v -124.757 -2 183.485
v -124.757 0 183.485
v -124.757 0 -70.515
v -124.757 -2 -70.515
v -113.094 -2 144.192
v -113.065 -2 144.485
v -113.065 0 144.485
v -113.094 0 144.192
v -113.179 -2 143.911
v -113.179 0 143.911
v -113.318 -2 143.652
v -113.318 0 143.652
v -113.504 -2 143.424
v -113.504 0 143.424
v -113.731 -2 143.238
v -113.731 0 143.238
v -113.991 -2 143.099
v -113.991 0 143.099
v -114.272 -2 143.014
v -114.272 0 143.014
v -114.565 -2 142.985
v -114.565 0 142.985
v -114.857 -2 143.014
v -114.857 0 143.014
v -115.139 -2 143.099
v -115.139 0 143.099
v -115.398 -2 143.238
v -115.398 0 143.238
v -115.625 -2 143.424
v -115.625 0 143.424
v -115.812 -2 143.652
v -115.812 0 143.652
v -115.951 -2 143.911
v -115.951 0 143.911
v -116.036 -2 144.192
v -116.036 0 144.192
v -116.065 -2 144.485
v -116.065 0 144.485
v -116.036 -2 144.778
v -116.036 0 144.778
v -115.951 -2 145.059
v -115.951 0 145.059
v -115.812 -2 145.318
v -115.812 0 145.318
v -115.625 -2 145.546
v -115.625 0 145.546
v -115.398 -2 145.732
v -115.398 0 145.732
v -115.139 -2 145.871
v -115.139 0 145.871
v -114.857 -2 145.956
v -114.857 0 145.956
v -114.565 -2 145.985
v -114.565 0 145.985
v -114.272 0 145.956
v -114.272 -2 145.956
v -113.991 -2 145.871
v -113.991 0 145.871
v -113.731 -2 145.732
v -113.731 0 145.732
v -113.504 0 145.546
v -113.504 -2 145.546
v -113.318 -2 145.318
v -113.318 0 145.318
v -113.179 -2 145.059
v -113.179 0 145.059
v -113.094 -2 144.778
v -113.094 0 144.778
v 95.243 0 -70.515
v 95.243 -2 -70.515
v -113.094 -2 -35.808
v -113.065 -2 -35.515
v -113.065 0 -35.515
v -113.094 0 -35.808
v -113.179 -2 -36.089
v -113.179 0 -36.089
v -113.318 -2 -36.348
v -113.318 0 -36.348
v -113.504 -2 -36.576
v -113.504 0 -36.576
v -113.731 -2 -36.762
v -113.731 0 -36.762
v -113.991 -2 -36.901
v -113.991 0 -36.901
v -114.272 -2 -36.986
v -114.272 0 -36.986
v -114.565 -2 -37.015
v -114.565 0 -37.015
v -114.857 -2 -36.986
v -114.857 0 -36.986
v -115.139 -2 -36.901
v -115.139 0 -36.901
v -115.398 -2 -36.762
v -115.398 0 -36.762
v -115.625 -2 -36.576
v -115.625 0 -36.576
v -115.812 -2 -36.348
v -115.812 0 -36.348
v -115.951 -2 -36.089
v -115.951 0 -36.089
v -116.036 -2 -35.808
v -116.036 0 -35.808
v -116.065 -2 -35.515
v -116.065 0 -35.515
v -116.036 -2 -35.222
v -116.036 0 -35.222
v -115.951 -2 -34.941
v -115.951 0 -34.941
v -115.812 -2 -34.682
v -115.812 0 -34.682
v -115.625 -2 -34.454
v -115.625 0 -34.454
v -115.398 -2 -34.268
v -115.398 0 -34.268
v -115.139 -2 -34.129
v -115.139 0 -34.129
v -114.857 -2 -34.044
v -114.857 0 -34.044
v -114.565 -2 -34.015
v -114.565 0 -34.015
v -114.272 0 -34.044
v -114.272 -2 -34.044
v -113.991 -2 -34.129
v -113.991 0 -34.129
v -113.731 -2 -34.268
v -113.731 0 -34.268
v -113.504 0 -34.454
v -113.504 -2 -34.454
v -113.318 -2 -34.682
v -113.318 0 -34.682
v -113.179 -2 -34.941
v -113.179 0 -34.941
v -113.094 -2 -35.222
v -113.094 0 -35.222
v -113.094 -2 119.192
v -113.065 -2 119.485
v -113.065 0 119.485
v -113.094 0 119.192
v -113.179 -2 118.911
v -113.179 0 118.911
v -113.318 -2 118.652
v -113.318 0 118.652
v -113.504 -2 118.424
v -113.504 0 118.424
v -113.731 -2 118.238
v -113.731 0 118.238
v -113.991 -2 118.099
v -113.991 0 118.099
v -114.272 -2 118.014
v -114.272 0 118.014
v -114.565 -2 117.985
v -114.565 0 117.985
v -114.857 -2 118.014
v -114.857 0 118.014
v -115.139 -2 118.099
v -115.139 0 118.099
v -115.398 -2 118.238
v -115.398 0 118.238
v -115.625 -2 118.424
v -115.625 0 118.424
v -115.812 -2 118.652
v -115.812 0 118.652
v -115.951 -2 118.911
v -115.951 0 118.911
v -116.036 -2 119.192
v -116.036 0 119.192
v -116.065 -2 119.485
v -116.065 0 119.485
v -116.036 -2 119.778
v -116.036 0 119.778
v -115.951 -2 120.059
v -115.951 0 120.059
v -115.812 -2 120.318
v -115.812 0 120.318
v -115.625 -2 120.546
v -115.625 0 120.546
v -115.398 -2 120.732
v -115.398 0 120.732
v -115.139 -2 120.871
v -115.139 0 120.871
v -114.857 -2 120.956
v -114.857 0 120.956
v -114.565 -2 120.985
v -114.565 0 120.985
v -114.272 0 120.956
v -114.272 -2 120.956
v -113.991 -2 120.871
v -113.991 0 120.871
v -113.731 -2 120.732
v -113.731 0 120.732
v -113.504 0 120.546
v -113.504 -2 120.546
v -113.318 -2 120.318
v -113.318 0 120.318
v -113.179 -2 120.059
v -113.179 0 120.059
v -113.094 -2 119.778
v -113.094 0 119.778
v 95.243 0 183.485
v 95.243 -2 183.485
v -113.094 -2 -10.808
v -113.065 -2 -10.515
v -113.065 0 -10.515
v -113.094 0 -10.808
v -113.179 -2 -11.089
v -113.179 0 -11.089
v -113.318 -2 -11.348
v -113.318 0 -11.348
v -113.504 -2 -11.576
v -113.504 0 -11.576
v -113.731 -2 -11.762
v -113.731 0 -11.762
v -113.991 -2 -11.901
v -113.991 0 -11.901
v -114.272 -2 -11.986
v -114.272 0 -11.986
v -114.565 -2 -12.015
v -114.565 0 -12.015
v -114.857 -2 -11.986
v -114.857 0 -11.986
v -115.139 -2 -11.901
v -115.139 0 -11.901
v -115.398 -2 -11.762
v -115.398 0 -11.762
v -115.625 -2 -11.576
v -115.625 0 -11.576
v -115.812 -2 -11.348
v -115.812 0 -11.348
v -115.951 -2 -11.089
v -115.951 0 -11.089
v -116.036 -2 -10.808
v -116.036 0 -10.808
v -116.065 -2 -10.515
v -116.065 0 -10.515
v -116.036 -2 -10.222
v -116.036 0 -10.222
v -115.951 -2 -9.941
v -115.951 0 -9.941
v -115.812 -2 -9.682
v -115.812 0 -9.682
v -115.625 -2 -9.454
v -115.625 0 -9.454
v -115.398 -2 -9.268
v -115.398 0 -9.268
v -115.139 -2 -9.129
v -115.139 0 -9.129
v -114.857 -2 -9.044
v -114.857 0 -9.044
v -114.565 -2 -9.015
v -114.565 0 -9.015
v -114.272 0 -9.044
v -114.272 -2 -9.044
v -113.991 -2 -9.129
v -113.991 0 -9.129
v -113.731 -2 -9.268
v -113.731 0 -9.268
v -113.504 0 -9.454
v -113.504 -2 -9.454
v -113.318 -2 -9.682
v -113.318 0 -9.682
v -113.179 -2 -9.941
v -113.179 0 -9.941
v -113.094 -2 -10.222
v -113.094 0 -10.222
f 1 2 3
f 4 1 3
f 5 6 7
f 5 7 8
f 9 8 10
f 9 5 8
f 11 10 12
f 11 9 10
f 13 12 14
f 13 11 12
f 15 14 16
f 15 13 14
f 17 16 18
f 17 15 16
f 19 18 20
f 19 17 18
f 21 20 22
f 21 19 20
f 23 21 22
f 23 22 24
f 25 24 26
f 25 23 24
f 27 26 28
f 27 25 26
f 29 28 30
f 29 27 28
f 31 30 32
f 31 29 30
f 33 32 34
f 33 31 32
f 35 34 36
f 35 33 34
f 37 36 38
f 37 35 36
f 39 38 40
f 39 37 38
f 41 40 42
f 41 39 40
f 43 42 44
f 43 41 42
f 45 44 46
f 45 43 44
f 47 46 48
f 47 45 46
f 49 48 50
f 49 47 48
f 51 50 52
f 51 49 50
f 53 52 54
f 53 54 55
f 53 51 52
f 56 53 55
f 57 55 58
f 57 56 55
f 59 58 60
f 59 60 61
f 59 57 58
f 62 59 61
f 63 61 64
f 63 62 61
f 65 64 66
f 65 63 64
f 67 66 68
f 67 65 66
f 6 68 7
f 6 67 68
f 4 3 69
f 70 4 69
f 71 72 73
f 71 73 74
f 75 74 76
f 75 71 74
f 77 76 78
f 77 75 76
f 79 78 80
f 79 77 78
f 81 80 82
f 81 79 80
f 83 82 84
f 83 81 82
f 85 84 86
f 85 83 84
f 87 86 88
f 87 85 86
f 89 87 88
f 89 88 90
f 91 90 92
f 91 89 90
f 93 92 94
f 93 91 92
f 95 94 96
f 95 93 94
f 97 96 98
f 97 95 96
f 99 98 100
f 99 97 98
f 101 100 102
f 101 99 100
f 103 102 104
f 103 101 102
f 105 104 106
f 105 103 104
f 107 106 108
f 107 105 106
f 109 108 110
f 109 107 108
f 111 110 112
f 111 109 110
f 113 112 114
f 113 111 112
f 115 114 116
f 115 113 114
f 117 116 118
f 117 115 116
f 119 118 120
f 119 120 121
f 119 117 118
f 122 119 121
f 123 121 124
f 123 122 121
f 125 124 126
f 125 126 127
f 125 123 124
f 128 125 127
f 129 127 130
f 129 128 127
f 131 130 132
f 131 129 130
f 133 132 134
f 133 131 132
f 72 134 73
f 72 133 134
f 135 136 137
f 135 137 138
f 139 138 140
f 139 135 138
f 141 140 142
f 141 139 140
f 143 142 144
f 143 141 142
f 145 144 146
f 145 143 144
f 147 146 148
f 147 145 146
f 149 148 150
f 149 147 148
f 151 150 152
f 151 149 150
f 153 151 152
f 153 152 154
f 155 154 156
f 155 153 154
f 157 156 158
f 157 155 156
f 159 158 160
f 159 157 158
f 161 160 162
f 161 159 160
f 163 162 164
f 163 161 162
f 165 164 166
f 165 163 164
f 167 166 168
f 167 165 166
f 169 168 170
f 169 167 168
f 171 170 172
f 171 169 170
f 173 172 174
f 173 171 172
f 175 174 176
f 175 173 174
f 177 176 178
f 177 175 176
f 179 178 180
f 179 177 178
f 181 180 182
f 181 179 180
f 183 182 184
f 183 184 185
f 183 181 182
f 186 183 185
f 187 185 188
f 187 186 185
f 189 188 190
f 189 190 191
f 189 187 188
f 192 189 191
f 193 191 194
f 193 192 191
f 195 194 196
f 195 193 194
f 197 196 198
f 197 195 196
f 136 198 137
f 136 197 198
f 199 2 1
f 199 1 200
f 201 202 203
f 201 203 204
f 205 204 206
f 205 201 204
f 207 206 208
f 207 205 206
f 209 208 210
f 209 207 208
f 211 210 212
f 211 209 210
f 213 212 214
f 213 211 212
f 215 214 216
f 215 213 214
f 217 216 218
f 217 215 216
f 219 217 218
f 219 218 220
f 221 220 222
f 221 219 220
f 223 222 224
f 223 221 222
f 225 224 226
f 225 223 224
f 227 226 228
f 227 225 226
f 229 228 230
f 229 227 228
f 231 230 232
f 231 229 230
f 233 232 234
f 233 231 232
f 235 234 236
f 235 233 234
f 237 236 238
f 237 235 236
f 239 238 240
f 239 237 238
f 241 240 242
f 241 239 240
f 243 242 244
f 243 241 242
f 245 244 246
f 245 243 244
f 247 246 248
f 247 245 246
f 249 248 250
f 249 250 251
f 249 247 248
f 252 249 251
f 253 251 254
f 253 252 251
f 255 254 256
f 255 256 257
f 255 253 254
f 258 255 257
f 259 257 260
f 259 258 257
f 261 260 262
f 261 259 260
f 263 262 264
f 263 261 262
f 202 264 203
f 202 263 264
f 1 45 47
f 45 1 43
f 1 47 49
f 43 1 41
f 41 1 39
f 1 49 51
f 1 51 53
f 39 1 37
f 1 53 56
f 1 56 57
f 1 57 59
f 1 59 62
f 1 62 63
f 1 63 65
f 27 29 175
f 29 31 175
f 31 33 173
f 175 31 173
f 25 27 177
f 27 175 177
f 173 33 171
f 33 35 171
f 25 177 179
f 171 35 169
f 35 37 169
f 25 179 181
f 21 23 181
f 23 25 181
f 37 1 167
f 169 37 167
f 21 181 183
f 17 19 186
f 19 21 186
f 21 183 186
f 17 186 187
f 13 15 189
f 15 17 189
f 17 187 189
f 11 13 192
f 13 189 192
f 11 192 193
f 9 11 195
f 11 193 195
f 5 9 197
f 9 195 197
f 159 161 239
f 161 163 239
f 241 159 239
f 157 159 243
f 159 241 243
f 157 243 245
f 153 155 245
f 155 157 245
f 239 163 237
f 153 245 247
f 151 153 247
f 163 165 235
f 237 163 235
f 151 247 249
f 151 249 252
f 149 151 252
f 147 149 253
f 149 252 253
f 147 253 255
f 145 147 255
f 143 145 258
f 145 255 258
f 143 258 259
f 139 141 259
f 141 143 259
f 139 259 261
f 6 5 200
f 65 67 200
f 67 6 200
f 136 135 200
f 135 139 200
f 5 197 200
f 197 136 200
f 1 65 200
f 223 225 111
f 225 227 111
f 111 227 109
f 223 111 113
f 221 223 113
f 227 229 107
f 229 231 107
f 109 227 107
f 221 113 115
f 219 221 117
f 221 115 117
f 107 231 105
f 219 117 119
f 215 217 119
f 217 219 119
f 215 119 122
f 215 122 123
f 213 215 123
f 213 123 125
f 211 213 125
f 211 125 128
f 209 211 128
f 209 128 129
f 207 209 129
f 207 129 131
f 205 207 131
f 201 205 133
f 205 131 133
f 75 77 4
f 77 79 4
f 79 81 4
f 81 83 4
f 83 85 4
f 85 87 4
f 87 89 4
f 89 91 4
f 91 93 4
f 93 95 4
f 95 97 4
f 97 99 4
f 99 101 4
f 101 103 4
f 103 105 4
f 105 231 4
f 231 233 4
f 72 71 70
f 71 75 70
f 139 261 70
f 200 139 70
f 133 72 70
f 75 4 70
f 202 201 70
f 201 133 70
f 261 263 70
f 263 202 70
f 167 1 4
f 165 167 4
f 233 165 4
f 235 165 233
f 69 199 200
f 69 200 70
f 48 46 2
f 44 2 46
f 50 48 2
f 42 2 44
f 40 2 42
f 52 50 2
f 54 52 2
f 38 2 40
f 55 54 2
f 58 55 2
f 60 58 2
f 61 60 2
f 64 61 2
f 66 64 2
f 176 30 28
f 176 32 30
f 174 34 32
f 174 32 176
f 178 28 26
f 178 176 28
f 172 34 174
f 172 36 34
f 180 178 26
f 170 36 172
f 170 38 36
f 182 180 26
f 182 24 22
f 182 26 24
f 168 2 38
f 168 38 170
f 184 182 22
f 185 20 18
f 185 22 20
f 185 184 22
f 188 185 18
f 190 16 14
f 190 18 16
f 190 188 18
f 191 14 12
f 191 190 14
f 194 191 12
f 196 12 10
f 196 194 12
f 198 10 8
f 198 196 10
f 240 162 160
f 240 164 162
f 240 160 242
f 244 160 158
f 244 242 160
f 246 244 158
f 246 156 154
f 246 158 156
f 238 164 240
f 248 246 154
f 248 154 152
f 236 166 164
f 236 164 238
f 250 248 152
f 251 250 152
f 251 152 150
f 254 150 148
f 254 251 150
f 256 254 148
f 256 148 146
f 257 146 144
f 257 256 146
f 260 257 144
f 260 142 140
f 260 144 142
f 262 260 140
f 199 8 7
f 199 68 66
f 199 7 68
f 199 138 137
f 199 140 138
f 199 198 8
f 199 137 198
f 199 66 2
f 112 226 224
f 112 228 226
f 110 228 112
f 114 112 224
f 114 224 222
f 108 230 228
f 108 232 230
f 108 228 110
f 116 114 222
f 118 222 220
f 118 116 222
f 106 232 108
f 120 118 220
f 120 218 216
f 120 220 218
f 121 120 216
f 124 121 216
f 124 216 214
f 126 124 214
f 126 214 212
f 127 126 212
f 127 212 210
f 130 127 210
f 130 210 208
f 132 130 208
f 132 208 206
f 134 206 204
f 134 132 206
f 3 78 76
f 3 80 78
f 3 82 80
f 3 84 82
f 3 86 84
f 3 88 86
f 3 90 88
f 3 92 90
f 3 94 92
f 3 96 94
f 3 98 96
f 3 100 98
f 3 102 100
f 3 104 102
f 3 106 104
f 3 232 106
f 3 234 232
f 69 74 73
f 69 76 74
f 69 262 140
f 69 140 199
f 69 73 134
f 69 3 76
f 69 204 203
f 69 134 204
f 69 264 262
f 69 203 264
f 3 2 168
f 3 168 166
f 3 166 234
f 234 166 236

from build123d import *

# Parameters (mm, degrees)
SKETCH1_W               = 220
SKETCH1_H               = 254
BASE_FLANGE1_DEPTH      = 2
ADVANCEDHOLE2_START     = -2
ADVANCEDHOLE2_OUTLINE_R = 1.5
ADVANCEDHOLE2_DEPTH     = 2


# Read off the part's stored shape, not the designer's step: AdvancedHole2
# Sheet-metal steps are written as plain solids
with BuildPart() as part:
    # Sketch1 → Base-Flange1 (new body)
    with BuildSketch(Plane(origin=(0, 0, 0), x_dir=(1, 0, 0), z_dir=(0, 1, 0))):
        with Locations((-14.757070341, -56.485134155)):
            Rectangle(SKETCH1_W, SKETCH1_H)
    extrude(amount=-BASE_FLANGE1_DEPTH)

    # AdvancedHole2 outline → AdvancedHole2 (cut)
    with BuildSketch(Plane(origin=(0, 0, 0), x_dir=(1, 0, 0), z_dir=(0, 1, 0)).offset(ADVANCEDHOLE2_START)):
        with Locations((-114.564799313, -144.485134155)):
            Circle(ADVANCEDHOLE2_OUTLINE_R)
        with Locations((-114.564799313, -119.485134155)):
            Circle(ADVANCEDHOLE2_OUTLINE_R)
        with Locations((-114.564799313, 10.514865845)):
            Circle(ADVANCEDHOLE2_OUTLINE_R)
        with Locations((-114.564799313, 35.514865845)):
            Circle(ADVANCEDHOLE2_OUTLINE_R)
    extrude(amount=ADVANCEDHOLE2_DEPTH, mode=Mode.SUBTRACT)


solid = part.part
